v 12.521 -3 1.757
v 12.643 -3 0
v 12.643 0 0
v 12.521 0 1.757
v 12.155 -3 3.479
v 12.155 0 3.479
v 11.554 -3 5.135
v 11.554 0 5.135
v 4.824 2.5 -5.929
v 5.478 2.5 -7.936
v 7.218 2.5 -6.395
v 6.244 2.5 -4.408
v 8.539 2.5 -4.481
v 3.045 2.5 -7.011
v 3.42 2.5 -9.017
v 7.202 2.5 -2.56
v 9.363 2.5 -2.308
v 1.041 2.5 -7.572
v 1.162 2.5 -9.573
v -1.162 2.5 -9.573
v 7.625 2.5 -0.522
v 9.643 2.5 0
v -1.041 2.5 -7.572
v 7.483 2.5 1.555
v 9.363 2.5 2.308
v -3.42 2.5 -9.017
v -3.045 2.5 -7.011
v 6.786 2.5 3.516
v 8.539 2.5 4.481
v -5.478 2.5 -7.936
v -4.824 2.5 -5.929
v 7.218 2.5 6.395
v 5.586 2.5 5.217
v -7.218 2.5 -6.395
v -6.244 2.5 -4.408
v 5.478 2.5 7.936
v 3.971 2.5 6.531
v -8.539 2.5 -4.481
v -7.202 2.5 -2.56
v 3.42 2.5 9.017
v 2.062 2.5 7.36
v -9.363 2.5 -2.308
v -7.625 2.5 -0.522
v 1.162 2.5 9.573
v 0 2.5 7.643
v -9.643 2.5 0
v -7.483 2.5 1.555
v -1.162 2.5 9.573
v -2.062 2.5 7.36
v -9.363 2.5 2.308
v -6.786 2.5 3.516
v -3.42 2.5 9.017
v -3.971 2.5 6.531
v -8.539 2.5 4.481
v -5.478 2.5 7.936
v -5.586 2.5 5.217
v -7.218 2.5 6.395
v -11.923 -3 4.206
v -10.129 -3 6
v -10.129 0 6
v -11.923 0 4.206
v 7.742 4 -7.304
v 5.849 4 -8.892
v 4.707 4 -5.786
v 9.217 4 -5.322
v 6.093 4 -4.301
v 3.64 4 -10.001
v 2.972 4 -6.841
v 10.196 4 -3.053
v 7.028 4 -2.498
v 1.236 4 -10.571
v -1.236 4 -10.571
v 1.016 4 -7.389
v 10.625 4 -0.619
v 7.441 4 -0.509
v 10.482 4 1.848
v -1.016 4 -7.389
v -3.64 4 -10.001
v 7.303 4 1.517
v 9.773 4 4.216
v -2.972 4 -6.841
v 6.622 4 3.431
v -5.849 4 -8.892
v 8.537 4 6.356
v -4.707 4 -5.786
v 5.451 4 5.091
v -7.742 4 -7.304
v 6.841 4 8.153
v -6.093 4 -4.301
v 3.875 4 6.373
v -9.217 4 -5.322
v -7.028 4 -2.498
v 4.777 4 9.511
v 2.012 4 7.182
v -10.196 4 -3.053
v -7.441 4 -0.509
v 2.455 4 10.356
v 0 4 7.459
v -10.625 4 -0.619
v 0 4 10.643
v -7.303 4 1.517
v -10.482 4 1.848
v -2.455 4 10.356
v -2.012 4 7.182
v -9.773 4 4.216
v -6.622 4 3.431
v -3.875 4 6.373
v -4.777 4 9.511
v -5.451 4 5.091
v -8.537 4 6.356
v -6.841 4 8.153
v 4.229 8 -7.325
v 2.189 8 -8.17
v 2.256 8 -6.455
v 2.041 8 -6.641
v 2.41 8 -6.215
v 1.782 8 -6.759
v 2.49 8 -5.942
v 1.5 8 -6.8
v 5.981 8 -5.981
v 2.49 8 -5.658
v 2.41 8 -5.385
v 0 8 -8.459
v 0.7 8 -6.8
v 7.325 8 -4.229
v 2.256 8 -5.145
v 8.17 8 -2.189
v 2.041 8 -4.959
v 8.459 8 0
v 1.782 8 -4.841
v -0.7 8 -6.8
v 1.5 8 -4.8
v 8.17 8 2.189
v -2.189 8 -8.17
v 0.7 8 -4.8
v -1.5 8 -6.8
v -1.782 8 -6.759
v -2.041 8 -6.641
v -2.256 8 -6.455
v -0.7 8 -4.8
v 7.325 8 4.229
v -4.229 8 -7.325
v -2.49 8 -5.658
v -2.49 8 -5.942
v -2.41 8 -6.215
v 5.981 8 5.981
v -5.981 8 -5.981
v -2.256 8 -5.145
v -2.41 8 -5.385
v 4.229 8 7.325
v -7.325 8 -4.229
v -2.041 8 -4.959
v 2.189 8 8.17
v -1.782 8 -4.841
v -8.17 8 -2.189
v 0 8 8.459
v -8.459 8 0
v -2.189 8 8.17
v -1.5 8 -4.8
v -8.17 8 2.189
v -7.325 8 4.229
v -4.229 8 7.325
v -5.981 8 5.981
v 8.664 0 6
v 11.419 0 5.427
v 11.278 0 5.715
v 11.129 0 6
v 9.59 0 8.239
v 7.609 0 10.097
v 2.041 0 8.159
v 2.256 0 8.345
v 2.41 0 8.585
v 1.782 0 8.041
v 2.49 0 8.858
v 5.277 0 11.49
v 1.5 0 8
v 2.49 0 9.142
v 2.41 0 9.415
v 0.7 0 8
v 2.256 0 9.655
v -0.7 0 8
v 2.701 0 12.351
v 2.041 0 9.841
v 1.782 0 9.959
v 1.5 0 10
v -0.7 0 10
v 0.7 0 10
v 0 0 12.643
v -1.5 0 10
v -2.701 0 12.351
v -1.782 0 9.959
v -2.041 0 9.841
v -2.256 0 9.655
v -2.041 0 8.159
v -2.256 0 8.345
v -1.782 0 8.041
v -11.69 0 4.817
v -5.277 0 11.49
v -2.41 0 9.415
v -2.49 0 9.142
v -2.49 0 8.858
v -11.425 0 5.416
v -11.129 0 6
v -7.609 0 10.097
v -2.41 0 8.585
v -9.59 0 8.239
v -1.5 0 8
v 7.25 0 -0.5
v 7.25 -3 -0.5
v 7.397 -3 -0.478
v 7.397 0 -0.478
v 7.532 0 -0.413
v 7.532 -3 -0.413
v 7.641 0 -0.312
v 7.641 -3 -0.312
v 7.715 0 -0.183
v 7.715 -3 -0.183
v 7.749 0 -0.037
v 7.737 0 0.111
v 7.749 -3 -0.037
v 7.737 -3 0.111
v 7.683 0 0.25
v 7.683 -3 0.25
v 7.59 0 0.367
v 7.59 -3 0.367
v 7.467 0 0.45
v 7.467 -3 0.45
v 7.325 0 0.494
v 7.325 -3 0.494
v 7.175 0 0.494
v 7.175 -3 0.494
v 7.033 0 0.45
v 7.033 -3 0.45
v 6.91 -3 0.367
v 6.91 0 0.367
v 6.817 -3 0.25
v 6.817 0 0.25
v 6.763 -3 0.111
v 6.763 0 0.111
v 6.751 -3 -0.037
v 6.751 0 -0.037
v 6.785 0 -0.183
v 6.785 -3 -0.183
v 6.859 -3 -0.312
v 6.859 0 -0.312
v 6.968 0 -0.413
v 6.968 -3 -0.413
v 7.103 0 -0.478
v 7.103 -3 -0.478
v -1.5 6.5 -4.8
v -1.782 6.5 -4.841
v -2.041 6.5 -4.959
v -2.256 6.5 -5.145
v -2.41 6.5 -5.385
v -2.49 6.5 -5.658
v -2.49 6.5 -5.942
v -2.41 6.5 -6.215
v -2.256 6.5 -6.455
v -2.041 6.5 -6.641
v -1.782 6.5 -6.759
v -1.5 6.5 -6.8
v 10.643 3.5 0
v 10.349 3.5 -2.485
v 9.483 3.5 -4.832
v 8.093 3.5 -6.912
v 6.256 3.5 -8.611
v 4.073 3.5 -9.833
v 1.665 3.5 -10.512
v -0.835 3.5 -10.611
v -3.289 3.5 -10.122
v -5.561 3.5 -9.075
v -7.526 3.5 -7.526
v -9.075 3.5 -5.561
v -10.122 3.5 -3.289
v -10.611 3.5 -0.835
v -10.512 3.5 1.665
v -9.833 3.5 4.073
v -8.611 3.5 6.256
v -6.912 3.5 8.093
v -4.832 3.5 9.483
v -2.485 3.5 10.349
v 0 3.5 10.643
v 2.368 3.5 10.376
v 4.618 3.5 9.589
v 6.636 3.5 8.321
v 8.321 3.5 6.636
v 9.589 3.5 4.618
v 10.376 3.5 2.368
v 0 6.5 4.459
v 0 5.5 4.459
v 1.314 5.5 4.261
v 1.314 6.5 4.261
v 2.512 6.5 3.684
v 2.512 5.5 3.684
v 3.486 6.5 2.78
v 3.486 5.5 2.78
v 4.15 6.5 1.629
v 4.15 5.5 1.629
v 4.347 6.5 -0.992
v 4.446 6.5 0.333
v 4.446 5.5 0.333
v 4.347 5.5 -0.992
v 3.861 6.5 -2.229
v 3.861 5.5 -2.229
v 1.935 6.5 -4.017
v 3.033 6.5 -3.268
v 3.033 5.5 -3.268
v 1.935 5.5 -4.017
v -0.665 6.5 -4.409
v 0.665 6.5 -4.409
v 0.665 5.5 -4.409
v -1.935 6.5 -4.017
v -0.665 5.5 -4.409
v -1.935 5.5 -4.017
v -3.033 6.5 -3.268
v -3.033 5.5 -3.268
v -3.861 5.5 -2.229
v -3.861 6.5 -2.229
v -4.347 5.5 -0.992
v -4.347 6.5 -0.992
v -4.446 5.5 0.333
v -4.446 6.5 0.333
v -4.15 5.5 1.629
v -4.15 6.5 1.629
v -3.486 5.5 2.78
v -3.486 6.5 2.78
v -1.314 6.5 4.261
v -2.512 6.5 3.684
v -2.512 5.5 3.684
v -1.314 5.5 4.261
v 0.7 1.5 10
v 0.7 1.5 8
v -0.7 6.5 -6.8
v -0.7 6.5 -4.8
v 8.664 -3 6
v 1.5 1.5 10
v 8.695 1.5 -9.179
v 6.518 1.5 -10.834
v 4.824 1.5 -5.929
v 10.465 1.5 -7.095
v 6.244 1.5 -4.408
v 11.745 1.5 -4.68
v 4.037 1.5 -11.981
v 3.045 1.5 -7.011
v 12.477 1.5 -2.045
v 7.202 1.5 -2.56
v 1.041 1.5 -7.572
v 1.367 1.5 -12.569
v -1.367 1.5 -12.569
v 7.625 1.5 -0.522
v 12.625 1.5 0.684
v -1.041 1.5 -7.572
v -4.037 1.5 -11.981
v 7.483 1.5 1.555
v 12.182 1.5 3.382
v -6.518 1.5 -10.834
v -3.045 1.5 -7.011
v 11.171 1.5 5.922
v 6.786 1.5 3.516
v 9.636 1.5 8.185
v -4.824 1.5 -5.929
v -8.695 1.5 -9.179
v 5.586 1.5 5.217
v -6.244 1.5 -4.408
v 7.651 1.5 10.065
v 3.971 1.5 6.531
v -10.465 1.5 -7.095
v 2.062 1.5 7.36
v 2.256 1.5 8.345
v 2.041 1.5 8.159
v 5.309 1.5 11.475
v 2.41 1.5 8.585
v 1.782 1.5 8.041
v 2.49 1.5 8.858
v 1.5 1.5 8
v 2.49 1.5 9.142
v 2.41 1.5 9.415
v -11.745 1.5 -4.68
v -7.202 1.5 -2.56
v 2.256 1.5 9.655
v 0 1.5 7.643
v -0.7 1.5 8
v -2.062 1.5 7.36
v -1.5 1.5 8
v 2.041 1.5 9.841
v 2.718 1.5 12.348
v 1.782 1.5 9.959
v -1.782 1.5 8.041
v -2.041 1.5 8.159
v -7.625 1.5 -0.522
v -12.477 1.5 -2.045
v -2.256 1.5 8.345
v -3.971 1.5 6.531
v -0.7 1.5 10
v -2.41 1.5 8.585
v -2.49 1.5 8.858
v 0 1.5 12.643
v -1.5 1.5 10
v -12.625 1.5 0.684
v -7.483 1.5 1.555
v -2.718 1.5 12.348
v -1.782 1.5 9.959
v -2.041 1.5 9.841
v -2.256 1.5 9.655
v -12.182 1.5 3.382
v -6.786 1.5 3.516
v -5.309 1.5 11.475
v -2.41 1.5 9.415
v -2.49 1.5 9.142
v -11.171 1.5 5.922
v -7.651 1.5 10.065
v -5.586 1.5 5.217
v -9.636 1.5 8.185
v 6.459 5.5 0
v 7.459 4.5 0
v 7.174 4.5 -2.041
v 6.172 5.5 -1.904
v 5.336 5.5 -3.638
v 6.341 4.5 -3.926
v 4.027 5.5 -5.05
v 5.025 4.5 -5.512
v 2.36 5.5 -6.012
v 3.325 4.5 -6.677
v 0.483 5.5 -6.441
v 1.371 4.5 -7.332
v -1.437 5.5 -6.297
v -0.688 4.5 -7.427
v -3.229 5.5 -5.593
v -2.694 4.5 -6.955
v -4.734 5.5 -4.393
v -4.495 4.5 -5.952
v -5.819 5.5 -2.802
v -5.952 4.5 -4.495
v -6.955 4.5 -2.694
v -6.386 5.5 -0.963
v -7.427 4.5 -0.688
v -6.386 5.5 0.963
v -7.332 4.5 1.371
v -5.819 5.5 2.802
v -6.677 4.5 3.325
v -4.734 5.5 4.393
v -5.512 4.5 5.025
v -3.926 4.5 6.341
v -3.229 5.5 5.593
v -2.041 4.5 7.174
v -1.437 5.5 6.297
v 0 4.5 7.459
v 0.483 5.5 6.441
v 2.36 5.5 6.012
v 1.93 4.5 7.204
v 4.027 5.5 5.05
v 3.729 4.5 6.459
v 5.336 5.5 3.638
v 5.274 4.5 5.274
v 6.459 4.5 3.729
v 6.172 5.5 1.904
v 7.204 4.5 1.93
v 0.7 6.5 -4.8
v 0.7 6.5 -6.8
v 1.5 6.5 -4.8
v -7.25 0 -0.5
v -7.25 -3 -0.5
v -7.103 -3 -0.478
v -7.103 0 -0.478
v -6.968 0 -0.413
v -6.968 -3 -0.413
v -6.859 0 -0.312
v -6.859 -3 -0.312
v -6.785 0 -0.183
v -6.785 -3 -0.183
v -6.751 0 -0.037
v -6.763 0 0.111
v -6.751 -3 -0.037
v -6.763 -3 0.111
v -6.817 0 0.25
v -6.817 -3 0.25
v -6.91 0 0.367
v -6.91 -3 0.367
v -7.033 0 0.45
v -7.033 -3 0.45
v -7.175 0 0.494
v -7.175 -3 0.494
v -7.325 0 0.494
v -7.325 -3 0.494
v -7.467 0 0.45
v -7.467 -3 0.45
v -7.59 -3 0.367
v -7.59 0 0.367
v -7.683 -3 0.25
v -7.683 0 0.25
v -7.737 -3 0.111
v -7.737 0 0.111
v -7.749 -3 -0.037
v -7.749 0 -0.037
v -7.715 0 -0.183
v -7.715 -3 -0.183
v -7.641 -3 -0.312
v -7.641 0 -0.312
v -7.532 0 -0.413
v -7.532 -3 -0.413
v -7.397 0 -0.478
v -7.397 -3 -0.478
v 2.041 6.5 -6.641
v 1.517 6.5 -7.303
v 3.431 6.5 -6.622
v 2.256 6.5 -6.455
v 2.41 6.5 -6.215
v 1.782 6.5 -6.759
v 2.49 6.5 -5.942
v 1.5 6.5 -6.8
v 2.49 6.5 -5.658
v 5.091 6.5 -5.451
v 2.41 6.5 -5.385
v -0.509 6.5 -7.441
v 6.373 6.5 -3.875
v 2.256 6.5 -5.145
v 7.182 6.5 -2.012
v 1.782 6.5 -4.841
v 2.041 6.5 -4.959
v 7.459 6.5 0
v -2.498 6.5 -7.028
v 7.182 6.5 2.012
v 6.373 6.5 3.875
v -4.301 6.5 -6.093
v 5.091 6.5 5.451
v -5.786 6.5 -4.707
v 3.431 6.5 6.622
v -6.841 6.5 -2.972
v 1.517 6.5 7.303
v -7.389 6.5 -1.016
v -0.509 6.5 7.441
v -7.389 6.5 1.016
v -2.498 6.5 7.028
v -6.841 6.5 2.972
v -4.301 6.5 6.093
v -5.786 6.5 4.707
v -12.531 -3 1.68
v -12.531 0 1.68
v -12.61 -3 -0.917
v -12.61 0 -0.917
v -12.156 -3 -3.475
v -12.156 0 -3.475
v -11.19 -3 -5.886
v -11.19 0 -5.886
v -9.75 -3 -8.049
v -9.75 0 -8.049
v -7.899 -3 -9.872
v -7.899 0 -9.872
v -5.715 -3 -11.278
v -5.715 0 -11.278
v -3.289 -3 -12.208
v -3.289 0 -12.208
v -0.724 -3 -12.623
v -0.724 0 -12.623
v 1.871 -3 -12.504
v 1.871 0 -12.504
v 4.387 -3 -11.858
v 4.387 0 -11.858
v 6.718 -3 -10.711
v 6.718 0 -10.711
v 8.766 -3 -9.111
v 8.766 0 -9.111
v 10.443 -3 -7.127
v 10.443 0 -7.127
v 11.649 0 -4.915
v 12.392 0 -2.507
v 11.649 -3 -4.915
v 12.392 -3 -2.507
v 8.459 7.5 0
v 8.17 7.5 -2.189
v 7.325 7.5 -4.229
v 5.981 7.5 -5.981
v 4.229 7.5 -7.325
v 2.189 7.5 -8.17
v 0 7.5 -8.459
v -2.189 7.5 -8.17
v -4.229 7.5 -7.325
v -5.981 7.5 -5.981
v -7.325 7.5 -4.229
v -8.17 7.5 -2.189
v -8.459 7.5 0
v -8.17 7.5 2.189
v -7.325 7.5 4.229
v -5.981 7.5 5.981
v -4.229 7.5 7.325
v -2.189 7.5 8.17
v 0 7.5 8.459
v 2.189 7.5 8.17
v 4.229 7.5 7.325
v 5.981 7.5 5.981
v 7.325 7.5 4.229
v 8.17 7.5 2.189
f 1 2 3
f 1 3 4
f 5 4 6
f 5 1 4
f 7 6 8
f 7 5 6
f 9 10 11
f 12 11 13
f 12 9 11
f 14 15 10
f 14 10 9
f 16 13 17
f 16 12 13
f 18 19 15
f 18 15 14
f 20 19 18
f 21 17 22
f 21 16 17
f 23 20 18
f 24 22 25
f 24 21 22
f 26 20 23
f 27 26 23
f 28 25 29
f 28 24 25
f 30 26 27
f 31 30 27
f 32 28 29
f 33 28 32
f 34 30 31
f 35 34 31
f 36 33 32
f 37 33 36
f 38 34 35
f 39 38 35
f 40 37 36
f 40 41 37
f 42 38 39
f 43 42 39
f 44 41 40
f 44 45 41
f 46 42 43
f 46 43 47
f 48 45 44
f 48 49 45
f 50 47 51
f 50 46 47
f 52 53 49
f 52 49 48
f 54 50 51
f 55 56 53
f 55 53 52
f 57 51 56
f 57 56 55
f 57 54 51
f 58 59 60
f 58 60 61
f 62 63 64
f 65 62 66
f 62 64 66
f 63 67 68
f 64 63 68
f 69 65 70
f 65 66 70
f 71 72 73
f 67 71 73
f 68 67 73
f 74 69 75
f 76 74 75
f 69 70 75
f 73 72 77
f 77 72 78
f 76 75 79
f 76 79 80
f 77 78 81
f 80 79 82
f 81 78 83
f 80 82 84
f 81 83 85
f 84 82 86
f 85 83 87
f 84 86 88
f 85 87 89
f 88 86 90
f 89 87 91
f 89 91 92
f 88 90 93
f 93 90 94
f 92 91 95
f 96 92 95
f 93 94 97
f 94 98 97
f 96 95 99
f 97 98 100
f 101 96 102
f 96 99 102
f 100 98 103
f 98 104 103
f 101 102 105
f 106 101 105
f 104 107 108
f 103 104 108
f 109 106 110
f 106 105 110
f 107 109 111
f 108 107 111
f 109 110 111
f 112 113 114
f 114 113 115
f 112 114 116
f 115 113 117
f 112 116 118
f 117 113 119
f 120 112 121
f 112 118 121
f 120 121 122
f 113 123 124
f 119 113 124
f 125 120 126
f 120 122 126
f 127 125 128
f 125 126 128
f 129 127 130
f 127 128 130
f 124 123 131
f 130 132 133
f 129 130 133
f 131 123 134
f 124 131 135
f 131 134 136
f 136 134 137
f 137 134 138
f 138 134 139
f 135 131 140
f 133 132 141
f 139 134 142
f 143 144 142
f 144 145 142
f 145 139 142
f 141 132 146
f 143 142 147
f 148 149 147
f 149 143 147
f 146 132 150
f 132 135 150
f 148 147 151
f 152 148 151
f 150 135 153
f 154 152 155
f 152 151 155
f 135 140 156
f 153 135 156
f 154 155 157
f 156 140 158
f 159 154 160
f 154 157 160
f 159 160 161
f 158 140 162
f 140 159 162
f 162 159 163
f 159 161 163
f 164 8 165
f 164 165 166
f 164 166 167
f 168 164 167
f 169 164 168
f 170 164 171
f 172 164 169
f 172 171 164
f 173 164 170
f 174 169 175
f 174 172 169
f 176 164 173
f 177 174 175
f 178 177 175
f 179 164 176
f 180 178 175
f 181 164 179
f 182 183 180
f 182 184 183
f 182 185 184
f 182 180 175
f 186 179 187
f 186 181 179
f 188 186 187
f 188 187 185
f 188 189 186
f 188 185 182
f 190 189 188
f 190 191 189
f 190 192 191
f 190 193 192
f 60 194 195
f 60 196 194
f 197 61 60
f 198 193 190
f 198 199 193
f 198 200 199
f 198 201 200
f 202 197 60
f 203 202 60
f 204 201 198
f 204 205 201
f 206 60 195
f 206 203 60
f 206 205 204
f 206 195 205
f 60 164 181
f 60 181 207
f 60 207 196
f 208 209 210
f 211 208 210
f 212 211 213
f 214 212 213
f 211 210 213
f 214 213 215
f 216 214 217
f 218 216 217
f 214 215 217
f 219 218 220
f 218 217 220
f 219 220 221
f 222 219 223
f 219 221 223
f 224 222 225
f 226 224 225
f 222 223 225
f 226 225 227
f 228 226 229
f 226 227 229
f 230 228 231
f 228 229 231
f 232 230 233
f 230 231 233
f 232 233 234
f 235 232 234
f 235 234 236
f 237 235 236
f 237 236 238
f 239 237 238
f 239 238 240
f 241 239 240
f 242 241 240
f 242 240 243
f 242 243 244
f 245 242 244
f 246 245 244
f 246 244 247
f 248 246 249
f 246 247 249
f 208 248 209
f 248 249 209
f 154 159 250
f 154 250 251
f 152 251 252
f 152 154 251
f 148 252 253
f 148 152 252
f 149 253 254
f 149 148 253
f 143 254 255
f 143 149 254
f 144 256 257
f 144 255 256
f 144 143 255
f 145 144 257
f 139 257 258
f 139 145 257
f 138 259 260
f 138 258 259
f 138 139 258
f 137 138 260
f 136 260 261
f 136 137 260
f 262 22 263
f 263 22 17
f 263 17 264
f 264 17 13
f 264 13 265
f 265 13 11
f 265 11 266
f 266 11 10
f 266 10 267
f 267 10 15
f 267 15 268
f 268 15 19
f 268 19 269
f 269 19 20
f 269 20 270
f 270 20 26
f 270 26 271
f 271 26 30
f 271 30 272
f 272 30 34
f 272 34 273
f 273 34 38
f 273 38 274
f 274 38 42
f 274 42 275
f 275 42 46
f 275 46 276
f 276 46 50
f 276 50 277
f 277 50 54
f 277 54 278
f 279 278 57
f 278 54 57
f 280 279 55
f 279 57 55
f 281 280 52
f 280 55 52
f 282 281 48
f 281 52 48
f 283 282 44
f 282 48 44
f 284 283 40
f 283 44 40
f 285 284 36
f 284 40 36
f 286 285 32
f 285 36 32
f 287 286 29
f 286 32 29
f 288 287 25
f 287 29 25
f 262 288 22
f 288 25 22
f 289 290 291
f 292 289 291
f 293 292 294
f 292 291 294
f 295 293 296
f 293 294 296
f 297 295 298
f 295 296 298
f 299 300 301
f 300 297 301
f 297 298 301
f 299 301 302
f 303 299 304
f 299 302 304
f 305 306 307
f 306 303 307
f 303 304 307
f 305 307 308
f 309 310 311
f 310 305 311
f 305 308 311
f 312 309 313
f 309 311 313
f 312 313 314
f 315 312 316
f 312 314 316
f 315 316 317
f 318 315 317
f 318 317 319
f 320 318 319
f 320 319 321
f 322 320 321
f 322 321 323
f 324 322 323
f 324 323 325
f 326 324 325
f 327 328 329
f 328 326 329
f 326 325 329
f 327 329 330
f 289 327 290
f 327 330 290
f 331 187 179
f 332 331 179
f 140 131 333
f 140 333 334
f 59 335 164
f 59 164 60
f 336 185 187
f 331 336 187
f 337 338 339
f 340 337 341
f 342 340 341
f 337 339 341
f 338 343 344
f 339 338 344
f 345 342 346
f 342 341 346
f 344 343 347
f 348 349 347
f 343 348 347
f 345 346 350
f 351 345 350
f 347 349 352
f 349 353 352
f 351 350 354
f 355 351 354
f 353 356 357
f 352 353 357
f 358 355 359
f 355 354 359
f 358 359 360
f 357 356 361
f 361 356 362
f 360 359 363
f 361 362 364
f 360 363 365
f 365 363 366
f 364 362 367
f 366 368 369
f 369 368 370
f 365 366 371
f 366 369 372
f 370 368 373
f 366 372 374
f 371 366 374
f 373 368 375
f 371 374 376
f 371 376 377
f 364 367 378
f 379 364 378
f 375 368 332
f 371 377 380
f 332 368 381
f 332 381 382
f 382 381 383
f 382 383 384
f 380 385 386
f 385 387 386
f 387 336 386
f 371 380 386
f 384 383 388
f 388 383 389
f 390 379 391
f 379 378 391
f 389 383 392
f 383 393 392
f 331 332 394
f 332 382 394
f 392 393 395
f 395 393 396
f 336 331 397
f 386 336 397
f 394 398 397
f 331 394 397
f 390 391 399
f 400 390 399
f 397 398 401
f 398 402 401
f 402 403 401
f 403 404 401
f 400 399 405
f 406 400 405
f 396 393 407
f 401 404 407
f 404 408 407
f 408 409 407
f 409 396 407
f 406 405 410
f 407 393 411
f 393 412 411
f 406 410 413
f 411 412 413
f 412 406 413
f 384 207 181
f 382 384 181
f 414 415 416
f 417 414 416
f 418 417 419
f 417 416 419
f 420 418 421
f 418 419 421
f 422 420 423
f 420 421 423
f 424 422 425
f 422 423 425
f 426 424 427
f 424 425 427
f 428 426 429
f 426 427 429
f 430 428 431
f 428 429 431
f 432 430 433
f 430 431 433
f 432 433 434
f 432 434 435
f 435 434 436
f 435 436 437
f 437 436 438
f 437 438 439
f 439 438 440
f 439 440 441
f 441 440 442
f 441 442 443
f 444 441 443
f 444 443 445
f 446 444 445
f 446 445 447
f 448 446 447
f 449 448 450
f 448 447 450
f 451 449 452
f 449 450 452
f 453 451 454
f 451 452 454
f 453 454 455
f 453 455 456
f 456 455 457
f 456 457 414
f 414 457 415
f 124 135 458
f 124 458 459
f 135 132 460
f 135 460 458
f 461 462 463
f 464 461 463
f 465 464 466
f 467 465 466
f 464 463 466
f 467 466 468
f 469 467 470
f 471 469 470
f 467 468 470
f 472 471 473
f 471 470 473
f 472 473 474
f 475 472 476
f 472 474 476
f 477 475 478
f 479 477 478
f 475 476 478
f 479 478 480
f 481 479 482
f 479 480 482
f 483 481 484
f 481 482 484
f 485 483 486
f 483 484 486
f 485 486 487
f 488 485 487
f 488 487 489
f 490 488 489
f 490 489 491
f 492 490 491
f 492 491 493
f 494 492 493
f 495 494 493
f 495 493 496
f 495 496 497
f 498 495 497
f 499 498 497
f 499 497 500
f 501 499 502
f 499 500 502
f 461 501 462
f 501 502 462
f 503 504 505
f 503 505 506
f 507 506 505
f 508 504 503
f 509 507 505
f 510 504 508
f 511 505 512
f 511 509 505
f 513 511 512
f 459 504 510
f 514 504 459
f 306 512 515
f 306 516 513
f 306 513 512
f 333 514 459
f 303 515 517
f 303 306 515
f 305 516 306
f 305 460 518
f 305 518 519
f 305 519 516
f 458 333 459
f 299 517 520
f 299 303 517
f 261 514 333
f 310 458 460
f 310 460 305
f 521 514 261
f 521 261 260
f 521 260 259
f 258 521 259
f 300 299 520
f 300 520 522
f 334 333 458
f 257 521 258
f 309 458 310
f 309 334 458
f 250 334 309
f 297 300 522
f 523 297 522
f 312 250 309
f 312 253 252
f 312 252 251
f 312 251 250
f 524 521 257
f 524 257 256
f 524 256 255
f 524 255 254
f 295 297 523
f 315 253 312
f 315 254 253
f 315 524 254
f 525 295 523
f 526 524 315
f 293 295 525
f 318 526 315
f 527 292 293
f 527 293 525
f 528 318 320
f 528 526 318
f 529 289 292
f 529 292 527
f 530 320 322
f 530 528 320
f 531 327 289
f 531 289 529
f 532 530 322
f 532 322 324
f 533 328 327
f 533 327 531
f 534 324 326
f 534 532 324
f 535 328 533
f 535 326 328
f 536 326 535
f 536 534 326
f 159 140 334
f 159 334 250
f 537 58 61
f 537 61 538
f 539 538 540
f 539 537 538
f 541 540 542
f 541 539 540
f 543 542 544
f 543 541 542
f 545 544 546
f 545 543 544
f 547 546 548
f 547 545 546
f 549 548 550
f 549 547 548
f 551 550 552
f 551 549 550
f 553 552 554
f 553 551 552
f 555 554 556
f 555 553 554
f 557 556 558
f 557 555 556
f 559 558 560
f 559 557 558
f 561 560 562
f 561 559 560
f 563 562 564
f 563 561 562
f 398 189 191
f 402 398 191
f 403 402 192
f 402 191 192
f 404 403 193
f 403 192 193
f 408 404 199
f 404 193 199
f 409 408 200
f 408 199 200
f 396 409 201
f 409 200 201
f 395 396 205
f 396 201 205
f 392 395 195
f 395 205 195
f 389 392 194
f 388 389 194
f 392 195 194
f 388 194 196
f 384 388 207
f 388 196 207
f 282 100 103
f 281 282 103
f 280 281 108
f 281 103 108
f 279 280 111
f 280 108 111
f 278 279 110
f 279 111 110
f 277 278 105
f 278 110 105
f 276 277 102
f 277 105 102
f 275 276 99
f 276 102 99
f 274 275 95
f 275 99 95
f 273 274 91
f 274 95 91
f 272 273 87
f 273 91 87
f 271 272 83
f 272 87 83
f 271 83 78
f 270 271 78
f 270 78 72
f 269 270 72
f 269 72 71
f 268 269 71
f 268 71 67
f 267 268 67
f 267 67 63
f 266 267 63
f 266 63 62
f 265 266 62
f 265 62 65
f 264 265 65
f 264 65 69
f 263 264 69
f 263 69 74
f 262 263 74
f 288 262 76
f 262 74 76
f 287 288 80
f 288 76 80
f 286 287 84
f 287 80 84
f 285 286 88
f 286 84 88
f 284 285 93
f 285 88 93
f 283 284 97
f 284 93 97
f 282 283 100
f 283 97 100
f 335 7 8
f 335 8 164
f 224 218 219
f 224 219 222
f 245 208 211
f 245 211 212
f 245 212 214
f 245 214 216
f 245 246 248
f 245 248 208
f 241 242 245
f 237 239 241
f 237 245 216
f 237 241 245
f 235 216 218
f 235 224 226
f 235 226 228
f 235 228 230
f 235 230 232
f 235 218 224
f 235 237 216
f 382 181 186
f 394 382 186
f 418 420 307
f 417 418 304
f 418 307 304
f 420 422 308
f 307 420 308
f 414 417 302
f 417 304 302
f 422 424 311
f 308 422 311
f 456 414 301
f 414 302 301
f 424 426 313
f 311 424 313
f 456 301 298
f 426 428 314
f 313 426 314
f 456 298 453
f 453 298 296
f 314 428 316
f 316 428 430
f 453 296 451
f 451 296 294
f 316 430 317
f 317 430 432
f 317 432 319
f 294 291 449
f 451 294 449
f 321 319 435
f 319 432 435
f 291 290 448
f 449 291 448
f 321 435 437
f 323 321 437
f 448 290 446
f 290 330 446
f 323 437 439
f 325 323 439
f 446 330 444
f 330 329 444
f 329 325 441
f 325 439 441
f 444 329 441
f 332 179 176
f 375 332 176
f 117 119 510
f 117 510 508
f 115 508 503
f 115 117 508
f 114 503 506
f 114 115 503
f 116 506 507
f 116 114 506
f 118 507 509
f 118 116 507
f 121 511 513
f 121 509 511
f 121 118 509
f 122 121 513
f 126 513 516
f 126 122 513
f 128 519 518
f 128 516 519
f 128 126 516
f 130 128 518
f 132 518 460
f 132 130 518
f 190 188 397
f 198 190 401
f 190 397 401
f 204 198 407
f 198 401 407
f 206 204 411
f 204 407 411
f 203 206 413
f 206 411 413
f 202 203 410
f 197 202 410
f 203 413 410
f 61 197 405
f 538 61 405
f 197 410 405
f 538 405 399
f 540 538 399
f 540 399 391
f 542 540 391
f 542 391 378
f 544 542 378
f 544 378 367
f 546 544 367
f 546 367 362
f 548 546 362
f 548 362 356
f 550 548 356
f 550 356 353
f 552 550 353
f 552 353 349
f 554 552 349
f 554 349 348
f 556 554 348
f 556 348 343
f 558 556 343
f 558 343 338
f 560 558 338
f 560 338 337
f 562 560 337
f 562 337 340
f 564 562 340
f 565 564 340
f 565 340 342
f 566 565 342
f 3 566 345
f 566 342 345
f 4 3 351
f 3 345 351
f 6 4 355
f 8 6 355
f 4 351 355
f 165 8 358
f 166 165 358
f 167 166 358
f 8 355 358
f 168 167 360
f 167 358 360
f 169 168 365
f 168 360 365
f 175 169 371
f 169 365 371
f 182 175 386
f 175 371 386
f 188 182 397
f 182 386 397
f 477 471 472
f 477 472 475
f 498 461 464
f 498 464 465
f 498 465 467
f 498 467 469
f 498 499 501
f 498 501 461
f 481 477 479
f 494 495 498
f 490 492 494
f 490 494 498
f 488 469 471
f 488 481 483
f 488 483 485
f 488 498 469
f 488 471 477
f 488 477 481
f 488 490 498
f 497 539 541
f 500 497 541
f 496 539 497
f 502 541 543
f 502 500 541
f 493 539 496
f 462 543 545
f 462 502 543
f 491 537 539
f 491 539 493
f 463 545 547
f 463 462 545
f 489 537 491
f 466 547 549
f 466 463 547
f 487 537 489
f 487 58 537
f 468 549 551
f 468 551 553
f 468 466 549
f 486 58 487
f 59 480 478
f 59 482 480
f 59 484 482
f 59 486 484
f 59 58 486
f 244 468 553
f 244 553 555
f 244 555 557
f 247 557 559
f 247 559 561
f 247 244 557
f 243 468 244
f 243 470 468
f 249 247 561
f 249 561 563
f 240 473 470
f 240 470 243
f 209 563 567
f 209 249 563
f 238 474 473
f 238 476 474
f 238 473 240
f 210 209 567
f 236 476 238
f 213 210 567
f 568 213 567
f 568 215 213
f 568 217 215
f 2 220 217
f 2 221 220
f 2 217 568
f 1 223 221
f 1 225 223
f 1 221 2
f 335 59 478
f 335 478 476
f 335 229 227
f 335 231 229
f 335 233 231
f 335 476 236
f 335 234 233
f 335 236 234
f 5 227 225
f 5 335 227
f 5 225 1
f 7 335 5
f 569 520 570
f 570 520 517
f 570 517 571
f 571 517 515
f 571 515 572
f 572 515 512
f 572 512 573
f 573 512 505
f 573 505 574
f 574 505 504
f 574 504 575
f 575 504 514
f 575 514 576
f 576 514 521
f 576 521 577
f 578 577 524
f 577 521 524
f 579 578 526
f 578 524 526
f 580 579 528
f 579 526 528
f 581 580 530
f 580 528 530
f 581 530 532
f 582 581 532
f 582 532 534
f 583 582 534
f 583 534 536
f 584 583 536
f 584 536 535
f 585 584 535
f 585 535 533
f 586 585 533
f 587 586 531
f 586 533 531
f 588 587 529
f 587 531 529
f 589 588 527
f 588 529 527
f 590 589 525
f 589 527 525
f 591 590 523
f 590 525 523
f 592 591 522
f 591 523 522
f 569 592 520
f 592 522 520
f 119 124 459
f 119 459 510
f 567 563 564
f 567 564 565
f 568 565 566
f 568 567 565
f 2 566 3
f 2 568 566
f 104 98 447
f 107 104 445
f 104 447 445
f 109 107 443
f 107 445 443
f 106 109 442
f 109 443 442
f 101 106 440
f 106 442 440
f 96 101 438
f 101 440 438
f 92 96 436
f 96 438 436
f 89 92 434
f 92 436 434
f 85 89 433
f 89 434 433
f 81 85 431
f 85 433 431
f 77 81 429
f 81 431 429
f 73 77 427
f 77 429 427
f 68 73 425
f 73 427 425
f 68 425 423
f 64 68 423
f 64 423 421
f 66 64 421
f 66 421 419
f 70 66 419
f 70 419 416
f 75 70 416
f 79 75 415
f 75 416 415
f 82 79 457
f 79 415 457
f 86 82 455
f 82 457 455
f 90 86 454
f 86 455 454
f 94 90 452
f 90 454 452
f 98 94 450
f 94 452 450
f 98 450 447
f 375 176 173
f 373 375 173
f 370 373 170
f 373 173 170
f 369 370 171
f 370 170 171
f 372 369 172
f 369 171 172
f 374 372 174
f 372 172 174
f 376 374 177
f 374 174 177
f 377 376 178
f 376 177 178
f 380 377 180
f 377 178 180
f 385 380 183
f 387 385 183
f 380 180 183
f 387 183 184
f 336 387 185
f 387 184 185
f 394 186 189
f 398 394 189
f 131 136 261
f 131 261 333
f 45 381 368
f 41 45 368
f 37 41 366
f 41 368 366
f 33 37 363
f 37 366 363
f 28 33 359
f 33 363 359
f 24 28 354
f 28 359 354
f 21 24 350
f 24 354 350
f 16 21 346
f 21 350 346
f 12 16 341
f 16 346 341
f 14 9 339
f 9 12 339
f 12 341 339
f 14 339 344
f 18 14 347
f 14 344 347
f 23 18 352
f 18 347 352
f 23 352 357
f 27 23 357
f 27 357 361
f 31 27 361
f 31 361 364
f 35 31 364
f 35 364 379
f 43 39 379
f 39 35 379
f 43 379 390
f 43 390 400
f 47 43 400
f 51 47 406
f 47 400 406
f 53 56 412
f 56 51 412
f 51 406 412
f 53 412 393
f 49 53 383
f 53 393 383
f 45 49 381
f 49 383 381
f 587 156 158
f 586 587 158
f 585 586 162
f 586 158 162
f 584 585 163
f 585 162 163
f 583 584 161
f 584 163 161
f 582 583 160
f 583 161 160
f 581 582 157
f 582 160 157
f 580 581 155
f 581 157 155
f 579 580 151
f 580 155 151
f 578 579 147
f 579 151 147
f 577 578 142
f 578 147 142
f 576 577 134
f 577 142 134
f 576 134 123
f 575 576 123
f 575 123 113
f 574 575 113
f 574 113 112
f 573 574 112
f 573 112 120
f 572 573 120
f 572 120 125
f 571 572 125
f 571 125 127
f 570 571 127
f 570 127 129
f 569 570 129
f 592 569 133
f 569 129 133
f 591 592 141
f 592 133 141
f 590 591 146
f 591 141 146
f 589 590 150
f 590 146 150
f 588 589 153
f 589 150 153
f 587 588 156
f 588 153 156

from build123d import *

# Parameters (mm, degrees)
SKETCH_24_R         = 7.643312102
BOSS_EXTRUDE1_DEPTH = 4
SKETCH3_W           = 5
SKETCH3_H           = 1.5
SKETCH3_W_2         = 3
SKETCH5_R           = 4.458598726
BOSS_EXTRUDE2_DEPTH = 4
SKETCH6_W           = 4
SKETCH6_H           = 1.5
SKETCH6_W_2         = 3
CUT_EXTRUDE2_DEPTH  = 2
CUT_EXTRUDE3_DEPTH  = 2
BOSS_EXTRUDE4_START = 3
SKETCH10_R          = 0.5
BOSS_EXTRUDE4_DEPTH = 3
CHAMFER1_START      = -4
CHAMFER1_2_DEPTH    = 4


with BuildPart() as part:
    # Sketch 24 → Boss-Extrude1 (new body)
    with BuildSketch(Plane(origin=(0, 0, 0), x_dir=(1, 0, 0), z_dir=(0, 1, 0))):
        with Locations(Location((0, 0, 0), (0, 0, 270))):
            Circle(SKETCH_24_R)
    extrude(amount=BOSS_EXTRUDE1_DEPTH)

    # Sketch3 → Revolve1 (revolve)
    with BuildSketch(Plane.XY, mode=Mode.PRIVATE) as revolve1_sk:
        with Locations((-10.143312102, 0.75)):
            Rectangle(SKETCH3_W, SKETCH3_H)
        with Locations((-9.143312102, 3.25)):
            Rectangle(SKETCH3_W_2, SKETCH3_H)
    revolve(revolve1_sk.sketch.rotate(Axis((0, 4, 0), (0, -1, 0)), 270), axis=Axis((0, 4, 0), (0, -1, 0)))

    # Sketch5 → Boss-Extrude2 (add)
    with BuildSketch(Plane(origin=(0, 4, 0), x_dir=(1, 0, 0), z_dir=(0, 1, 0))):
        with Locations(Location((0, 0, 0), (0, 0, 270))):
            Circle(SKETCH5_R)
    extrude(amount=BOSS_EXTRUDE2_DEPTH)

    # Sketch6 → Revolve2 (revolve)
    with BuildSketch(Plane.XY, mode=Mode.PRIVATE) as revolve2_sk:
        with Locations((-6.458598726, 7.25)):
            Rectangle(SKETCH6_W, SKETCH6_H)
        with Locations((-5.958598726, 4.75)):
            Rectangle(SKETCH6_W_2, SKETCH6_H)
    revolve(revolve2_sk.sketch.rotate(Axis((0, 4, 0), (0, -1, 0)), 270), axis=Axis((0, 4, 0), (0, -1, 0)))

    # Sketch8 → Cut-Extrude2 (cut)
    with BuildSketch(Plane.XZ):
        with BuildLine():
            Line((-0.7, 10), (-1.5, 10))
            ThreePointArc((-1.5, 10), (-2.5, 9), (-1.5, 8))
            Line((-1.5, 8), (-0.7, 8))
            Line((-0.7, 8), (-0.7, 10))
        make_face()
        with BuildLine():
            Line((1.5, 10), (0.7, 10))
            Line((0.7, 10), (0.7, 8))
            Line((0.7, 8), (1.5, 8))
            ThreePointArc((1.5, 8), (2.5, 9), (1.5, 10))
        make_face()
    extrude(amount=-CUT_EXTRUDE2_DEPTH, mode=Mode.SUBTRACT)

    # Sketch9 → Cut-Extrude3 (cut)
    with BuildSketch(Plane(origin=(0, 8, -8), x_dir=(-1, 0, 0), z_dir=(0, -1, 0))):
        with BuildLine():
            Line((-0.7, -1.2), (-1.5, -1.2))
            ThreePointArc((-1.5, -1.2), (-2.5, -2.2), (-1.5, -3.2))
            Line((-1.5, -3.2), (-0.7, -3.2))
            Line((-0.7, -3.2), (-0.7, -1.2))
        make_face()
        with BuildLine():
            Line((1.5, -1.2), (0.7, -1.2))
            Line((0.7, -1.2), (0.7, -3.2))
            Line((0.7, -3.2), (1.5, -3.2))
            ThreePointArc((1.5, -3.2), (2.5, -2.2), (1.5, -1.2))
        make_face()
    extrude(amount=CUT_EXTRUDE3_DEPTH, mode=Mode.SUBTRACT)

    # Sketch10 → Boss-Extrude4 (add)
    with BuildSketch(Plane.XZ.offset(BOSS_EXTRUDE4_START)):
        with BuildLine():
            Line((11.12894159, 6), (-11.12894159, 6))
            ThreePointArc((-11.12894159, 6), (-6.572693348, -10.800603829), (10.442822057, -7.127468582))
            ThreePointArc((10.442822057, -7.127468582), (12.080670499, -3.729710606), (12.643312102, 0))
            ThreePointArc((12.643312102, 0), (12.258874801, 3.094079752), (11.12894159, 6))
        make_face()
        with Locations(Location((-7.25, 0, 0), (0, 0, 270))):
            Circle(SKETCH10_R, mode=Mode.SUBTRACT)
        with Locations(Location((7.25, 0, 0), (0, 0, 270))):
            Circle(SKETCH10_R, mode=Mode.SUBTRACT)
    extrude(amount=-BOSS_EXTRUDE4_DEPTH)

    # Chamfer1: read off the stored shape, not the designer's step
    # Chamfer1 outline → Chamfer1 (revolve, cut)
    with BuildSketch(Plane.XY):
        Polygon((10.643312102, 3.5), (9.643312102, 2.5), (10.643312102, 2.5), align=None)
        Polygon((6.458598726, 5.5), (7.458598726, 4.5), (7.458598726, 5.5), align=None)
        Polygon((7.458598726, 6.5), (8.458598726, 6.5), (8.458598726, 7.5), align=None)
    revolve(axis=Axis((0, 0, 0), (0, 1, 0)), mode=Mode.SUBTRACT)

    # Chamfer1 2 outline → Chamfer1 2 (cut)
    with BuildSketch(Plane(origin=(0, 0, 0), x_dir=(1, 0, 0), z_dir=(0, 1, 0)).offset(CHAMFER1_START)):
        with BuildLine():
            ThreePointArc((11.12894159, -6), (11.349578809, -5.571391366), (11.553716625, -5.134683345))
            Line((11.553716625, -5.134683345), (8.663849742, -6))
            Line((8.663849742, -6), (11.12894159, -6))
        make_face()
        with BuildLine():
            Line((-11.12894159, -6), (-10.12894159, -6))
            Line((-10.12894159, -6), (-11.923354215, -4.205587374))
            ThreePointArc((-11.923354215, -4.205587374), (-11.561014862, -5.118229798), (-11.12894159, -6))
        make_face()
    extrude(amount=CHAMFER1_2_DEPTH, mode=Mode.SUBTRACT)


solid = part.part
